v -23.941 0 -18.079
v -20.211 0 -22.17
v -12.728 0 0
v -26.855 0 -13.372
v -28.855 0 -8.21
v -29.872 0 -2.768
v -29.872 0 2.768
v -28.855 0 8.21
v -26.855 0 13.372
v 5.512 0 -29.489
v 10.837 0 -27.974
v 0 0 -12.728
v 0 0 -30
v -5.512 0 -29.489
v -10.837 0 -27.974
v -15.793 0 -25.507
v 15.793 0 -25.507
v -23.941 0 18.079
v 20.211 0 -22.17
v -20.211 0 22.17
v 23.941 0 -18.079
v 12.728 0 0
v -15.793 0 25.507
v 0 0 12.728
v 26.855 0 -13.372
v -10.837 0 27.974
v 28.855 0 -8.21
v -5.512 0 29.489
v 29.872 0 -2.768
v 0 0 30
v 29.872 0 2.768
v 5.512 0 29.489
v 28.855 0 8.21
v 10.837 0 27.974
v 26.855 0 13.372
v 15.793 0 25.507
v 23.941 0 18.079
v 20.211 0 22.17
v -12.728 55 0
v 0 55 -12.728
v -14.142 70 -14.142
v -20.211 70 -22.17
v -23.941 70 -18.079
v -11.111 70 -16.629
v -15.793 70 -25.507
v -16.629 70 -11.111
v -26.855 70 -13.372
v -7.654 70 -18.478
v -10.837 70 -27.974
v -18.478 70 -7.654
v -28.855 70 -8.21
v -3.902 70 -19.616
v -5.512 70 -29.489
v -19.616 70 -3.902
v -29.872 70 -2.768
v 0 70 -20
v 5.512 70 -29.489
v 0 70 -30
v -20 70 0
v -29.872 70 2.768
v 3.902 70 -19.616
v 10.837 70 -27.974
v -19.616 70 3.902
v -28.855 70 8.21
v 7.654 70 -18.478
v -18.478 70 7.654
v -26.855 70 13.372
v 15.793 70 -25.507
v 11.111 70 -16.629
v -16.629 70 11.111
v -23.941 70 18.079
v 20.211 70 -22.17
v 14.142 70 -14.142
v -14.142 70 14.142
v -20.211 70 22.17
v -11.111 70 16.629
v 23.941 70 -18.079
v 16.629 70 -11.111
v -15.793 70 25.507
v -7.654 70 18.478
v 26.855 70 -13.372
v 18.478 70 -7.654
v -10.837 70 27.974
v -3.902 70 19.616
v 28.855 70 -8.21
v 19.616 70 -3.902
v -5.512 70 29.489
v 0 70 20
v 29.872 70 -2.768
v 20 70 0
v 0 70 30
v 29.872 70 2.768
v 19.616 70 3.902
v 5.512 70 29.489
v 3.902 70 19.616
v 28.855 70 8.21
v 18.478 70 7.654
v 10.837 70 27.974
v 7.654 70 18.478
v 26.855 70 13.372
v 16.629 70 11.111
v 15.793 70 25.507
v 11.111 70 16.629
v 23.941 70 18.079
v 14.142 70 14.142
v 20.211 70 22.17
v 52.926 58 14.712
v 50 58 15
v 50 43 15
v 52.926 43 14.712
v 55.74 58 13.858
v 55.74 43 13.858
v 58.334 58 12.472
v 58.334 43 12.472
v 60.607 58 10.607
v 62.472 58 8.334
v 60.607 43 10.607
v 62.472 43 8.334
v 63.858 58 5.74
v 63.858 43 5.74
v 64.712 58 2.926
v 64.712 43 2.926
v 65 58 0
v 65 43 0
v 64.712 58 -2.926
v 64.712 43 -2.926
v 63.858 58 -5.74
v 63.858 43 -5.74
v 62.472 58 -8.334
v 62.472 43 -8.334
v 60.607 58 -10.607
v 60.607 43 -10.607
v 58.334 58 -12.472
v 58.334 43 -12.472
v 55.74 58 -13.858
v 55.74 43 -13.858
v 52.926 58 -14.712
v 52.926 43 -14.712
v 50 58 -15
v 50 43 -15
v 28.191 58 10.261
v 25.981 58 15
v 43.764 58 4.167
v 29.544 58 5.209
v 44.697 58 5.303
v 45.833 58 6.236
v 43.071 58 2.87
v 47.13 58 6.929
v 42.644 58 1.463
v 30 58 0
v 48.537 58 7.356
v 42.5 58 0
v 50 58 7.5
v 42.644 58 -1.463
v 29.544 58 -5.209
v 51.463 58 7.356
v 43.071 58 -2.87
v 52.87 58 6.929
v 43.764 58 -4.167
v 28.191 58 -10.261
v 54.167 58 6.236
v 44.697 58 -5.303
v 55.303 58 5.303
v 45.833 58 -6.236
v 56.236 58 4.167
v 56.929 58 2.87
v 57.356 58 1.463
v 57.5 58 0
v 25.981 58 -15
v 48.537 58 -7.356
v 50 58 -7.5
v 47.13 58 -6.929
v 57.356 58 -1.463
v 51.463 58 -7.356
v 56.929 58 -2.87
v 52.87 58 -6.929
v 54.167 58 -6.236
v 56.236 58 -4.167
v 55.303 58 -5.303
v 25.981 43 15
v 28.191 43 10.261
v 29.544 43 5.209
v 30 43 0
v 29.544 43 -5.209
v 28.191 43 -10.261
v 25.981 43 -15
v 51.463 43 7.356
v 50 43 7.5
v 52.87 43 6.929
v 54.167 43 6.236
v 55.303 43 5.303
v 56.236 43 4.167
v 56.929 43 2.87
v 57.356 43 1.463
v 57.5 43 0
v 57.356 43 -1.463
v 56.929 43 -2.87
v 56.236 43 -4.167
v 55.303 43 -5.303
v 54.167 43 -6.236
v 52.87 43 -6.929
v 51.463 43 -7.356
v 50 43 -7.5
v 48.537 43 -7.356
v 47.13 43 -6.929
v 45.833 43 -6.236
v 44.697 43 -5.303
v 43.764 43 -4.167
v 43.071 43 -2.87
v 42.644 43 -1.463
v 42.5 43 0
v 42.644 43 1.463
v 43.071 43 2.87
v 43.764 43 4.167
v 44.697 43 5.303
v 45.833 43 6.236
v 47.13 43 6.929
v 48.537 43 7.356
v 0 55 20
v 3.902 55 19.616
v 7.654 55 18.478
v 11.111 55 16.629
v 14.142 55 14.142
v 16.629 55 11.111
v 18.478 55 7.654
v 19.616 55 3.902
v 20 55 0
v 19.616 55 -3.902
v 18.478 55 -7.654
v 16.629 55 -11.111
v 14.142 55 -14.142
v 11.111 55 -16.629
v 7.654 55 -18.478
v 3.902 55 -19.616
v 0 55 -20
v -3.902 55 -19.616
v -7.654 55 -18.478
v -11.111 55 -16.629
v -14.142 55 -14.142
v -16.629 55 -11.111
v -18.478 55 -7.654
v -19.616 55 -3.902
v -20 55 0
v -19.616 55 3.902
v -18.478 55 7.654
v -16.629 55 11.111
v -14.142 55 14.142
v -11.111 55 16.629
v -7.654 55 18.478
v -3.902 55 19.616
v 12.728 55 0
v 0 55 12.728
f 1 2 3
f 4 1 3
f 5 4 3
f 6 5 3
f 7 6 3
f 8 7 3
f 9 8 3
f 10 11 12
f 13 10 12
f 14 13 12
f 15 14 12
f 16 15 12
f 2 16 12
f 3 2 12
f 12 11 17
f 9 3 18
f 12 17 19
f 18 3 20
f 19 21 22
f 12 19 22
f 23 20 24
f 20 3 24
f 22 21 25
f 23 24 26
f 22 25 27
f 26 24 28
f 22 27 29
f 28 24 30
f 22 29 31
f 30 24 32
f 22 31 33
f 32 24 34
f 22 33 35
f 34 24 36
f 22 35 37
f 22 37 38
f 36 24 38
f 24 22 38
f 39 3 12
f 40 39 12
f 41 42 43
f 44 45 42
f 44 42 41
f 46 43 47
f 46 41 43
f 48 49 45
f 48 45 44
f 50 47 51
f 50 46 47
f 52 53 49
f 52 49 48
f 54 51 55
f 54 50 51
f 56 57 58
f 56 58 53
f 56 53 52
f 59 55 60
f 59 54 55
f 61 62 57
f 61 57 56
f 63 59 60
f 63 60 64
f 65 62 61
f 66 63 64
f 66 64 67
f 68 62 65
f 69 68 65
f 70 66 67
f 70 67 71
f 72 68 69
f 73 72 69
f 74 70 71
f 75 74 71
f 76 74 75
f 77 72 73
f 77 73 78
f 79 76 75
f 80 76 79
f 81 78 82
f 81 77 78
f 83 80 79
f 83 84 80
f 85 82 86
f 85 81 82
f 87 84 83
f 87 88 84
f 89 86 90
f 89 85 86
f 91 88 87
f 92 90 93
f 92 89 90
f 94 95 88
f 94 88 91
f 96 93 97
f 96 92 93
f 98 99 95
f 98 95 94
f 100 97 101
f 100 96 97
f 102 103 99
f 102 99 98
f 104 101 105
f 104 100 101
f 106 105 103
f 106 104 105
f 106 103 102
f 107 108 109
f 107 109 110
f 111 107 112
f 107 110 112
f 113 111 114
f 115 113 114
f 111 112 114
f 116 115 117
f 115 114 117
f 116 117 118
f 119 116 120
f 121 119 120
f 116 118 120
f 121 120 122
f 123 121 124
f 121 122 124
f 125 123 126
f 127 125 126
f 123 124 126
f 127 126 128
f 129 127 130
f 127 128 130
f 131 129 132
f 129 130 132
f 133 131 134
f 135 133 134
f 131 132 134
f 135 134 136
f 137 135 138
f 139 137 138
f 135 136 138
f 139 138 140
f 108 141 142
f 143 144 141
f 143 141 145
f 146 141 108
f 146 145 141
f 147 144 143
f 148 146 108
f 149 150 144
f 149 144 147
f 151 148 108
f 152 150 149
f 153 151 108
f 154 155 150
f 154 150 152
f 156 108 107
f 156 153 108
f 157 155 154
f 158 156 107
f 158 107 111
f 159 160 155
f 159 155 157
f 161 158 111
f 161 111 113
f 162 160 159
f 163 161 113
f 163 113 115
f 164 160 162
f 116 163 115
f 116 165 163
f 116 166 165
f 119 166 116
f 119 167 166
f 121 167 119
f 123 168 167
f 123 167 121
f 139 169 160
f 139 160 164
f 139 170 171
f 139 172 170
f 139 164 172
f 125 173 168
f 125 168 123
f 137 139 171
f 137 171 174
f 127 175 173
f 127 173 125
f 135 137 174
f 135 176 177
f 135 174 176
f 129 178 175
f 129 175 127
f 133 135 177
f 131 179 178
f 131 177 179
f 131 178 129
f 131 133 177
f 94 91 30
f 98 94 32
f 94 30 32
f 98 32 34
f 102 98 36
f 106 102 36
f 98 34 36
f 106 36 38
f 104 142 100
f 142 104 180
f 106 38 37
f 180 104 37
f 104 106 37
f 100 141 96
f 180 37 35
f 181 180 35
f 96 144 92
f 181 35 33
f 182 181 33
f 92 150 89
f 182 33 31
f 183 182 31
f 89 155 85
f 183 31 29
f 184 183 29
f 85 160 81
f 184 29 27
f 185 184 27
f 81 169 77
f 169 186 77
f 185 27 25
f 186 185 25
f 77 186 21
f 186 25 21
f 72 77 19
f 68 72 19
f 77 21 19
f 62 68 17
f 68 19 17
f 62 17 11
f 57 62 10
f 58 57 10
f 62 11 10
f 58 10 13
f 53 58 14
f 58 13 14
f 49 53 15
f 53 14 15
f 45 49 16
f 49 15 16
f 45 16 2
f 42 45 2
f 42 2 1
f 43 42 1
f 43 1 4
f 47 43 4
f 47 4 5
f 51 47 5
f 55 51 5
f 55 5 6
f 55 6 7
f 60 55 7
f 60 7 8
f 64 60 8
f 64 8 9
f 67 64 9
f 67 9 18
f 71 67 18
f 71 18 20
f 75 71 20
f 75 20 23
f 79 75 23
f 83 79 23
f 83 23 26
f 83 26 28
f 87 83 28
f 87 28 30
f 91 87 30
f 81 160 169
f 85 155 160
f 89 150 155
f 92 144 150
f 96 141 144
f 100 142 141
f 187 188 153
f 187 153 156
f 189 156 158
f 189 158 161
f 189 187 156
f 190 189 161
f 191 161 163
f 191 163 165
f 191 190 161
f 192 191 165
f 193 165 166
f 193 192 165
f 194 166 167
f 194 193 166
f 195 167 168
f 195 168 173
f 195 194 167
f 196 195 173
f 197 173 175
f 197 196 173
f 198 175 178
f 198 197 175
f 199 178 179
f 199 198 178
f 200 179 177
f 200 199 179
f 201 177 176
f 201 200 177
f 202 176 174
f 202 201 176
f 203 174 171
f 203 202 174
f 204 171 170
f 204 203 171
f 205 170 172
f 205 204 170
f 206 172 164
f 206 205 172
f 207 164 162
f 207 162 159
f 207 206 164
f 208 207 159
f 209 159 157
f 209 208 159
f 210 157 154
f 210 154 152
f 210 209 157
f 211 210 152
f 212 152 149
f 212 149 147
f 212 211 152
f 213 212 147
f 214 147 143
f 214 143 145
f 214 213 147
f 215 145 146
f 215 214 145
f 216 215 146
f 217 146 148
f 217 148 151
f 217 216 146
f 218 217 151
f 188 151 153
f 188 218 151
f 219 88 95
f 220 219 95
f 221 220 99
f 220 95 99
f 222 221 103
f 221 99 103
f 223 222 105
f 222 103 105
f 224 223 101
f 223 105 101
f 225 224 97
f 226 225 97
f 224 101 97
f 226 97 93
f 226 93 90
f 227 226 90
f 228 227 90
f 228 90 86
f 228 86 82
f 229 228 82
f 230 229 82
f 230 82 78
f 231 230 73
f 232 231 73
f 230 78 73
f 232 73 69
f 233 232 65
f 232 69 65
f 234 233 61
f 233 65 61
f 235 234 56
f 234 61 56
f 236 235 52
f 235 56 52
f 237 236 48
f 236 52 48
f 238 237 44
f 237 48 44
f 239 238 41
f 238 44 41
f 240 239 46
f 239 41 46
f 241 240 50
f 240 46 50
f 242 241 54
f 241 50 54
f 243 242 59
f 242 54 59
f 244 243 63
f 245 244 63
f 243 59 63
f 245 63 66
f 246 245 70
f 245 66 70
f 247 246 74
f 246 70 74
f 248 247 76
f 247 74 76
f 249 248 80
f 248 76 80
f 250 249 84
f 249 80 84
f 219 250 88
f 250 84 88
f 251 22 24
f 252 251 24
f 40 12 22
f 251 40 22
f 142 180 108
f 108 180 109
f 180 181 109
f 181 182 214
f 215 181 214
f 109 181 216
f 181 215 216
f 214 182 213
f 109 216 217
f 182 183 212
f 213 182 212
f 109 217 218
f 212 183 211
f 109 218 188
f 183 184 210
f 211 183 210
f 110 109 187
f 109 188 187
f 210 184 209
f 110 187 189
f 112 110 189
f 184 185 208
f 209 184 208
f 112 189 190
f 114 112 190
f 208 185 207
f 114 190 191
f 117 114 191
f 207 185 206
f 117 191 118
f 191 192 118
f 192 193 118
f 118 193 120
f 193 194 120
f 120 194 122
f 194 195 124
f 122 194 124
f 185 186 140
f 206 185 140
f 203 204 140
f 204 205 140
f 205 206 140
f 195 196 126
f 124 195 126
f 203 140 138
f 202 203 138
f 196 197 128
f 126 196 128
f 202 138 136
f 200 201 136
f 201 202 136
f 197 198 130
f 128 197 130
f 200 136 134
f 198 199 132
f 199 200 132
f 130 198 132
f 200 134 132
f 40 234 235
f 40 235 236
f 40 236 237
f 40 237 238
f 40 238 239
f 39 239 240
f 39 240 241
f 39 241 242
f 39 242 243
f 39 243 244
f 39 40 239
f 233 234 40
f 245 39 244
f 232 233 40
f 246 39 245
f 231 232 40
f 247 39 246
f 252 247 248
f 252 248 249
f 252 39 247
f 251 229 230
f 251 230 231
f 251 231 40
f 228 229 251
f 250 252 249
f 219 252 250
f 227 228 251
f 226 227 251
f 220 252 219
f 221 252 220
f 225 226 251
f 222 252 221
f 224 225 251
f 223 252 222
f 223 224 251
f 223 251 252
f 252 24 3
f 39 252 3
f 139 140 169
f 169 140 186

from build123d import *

# Parameters (mm, degrees)
SKETCH_1_R          = 30
EXTRUDE_1_DEPTH     = 70
EXTRUDE_START       = 43
SKETCH_1_4_R        = 7.5
EXTRUDE_2_DEPTH     = 15
SKETCH_3_R          = 20
CUT_EXTRUDE_1_DEPTH = 15
CUT_EXTRUDE_2_DEPTH = 91.277350426


with BuildPart() as part:
    # 草图1 → 凸台-拉伸1 (new body)
    with BuildSketch(Plane(origin=(0, 0, 0), x_dir=(1, 0, 0), z_dir=(0, 1, 0))):
        Circle(SKETCH_1_R)
    extrude(amount=EXTRUDE_1_DEPTH)

    # 草图1<4> → 凸台-拉伸2 (add)
    with BuildSketch(Plane(origin=(0, 0, 0), x_dir=(1, 0, 0), z_dir=(0, 1, 0)).offset(EXTRUDE_START)):
        with BuildLine():
            ThreePointArc((25.980762114, 15), (30, 0), (25.980762114, -15))
            Line((25.980762114, -15), (50, -15))
            ThreePointArc((50, -15), (65, 0), (50, 15))
            Line((50, 15), (25.980762114, 15))
        make_face()
        with Locations((50, 0)):
            Circle(SKETCH_1_4_R, mode=Mode.SUBTRACT)
    extrude(amount=EXTRUDE_2_DEPTH)

    # 草图3 → 切除-拉伸1 (cut)
    with BuildSketch(Plane(origin=(0, 70, 0), x_dir=(1, 0, 0), z_dir=(0, 1, 0))):
        Circle(SKETCH_3_R)
    extrude(amount=-CUT_EXTRUDE_1_DEPTH, mode=Mode.SUBTRACT)

    # 草图4 → 切除-拉伸2 (cut, through all)
    with BuildSketch(Plane(origin=(0, 55, 0), x_dir=(1, 0, 0), z_dir=(0, 1, 0))):
        Polygon((0, -12.727922061), (-12.727922061, 0), (0, 12.727922061), (12.727922061, 0), align=None)
    extrude(amount=-CUT_EXTRUDE_2_DEPTH, mode=Mode.SUBTRACT)


solid = part.part
